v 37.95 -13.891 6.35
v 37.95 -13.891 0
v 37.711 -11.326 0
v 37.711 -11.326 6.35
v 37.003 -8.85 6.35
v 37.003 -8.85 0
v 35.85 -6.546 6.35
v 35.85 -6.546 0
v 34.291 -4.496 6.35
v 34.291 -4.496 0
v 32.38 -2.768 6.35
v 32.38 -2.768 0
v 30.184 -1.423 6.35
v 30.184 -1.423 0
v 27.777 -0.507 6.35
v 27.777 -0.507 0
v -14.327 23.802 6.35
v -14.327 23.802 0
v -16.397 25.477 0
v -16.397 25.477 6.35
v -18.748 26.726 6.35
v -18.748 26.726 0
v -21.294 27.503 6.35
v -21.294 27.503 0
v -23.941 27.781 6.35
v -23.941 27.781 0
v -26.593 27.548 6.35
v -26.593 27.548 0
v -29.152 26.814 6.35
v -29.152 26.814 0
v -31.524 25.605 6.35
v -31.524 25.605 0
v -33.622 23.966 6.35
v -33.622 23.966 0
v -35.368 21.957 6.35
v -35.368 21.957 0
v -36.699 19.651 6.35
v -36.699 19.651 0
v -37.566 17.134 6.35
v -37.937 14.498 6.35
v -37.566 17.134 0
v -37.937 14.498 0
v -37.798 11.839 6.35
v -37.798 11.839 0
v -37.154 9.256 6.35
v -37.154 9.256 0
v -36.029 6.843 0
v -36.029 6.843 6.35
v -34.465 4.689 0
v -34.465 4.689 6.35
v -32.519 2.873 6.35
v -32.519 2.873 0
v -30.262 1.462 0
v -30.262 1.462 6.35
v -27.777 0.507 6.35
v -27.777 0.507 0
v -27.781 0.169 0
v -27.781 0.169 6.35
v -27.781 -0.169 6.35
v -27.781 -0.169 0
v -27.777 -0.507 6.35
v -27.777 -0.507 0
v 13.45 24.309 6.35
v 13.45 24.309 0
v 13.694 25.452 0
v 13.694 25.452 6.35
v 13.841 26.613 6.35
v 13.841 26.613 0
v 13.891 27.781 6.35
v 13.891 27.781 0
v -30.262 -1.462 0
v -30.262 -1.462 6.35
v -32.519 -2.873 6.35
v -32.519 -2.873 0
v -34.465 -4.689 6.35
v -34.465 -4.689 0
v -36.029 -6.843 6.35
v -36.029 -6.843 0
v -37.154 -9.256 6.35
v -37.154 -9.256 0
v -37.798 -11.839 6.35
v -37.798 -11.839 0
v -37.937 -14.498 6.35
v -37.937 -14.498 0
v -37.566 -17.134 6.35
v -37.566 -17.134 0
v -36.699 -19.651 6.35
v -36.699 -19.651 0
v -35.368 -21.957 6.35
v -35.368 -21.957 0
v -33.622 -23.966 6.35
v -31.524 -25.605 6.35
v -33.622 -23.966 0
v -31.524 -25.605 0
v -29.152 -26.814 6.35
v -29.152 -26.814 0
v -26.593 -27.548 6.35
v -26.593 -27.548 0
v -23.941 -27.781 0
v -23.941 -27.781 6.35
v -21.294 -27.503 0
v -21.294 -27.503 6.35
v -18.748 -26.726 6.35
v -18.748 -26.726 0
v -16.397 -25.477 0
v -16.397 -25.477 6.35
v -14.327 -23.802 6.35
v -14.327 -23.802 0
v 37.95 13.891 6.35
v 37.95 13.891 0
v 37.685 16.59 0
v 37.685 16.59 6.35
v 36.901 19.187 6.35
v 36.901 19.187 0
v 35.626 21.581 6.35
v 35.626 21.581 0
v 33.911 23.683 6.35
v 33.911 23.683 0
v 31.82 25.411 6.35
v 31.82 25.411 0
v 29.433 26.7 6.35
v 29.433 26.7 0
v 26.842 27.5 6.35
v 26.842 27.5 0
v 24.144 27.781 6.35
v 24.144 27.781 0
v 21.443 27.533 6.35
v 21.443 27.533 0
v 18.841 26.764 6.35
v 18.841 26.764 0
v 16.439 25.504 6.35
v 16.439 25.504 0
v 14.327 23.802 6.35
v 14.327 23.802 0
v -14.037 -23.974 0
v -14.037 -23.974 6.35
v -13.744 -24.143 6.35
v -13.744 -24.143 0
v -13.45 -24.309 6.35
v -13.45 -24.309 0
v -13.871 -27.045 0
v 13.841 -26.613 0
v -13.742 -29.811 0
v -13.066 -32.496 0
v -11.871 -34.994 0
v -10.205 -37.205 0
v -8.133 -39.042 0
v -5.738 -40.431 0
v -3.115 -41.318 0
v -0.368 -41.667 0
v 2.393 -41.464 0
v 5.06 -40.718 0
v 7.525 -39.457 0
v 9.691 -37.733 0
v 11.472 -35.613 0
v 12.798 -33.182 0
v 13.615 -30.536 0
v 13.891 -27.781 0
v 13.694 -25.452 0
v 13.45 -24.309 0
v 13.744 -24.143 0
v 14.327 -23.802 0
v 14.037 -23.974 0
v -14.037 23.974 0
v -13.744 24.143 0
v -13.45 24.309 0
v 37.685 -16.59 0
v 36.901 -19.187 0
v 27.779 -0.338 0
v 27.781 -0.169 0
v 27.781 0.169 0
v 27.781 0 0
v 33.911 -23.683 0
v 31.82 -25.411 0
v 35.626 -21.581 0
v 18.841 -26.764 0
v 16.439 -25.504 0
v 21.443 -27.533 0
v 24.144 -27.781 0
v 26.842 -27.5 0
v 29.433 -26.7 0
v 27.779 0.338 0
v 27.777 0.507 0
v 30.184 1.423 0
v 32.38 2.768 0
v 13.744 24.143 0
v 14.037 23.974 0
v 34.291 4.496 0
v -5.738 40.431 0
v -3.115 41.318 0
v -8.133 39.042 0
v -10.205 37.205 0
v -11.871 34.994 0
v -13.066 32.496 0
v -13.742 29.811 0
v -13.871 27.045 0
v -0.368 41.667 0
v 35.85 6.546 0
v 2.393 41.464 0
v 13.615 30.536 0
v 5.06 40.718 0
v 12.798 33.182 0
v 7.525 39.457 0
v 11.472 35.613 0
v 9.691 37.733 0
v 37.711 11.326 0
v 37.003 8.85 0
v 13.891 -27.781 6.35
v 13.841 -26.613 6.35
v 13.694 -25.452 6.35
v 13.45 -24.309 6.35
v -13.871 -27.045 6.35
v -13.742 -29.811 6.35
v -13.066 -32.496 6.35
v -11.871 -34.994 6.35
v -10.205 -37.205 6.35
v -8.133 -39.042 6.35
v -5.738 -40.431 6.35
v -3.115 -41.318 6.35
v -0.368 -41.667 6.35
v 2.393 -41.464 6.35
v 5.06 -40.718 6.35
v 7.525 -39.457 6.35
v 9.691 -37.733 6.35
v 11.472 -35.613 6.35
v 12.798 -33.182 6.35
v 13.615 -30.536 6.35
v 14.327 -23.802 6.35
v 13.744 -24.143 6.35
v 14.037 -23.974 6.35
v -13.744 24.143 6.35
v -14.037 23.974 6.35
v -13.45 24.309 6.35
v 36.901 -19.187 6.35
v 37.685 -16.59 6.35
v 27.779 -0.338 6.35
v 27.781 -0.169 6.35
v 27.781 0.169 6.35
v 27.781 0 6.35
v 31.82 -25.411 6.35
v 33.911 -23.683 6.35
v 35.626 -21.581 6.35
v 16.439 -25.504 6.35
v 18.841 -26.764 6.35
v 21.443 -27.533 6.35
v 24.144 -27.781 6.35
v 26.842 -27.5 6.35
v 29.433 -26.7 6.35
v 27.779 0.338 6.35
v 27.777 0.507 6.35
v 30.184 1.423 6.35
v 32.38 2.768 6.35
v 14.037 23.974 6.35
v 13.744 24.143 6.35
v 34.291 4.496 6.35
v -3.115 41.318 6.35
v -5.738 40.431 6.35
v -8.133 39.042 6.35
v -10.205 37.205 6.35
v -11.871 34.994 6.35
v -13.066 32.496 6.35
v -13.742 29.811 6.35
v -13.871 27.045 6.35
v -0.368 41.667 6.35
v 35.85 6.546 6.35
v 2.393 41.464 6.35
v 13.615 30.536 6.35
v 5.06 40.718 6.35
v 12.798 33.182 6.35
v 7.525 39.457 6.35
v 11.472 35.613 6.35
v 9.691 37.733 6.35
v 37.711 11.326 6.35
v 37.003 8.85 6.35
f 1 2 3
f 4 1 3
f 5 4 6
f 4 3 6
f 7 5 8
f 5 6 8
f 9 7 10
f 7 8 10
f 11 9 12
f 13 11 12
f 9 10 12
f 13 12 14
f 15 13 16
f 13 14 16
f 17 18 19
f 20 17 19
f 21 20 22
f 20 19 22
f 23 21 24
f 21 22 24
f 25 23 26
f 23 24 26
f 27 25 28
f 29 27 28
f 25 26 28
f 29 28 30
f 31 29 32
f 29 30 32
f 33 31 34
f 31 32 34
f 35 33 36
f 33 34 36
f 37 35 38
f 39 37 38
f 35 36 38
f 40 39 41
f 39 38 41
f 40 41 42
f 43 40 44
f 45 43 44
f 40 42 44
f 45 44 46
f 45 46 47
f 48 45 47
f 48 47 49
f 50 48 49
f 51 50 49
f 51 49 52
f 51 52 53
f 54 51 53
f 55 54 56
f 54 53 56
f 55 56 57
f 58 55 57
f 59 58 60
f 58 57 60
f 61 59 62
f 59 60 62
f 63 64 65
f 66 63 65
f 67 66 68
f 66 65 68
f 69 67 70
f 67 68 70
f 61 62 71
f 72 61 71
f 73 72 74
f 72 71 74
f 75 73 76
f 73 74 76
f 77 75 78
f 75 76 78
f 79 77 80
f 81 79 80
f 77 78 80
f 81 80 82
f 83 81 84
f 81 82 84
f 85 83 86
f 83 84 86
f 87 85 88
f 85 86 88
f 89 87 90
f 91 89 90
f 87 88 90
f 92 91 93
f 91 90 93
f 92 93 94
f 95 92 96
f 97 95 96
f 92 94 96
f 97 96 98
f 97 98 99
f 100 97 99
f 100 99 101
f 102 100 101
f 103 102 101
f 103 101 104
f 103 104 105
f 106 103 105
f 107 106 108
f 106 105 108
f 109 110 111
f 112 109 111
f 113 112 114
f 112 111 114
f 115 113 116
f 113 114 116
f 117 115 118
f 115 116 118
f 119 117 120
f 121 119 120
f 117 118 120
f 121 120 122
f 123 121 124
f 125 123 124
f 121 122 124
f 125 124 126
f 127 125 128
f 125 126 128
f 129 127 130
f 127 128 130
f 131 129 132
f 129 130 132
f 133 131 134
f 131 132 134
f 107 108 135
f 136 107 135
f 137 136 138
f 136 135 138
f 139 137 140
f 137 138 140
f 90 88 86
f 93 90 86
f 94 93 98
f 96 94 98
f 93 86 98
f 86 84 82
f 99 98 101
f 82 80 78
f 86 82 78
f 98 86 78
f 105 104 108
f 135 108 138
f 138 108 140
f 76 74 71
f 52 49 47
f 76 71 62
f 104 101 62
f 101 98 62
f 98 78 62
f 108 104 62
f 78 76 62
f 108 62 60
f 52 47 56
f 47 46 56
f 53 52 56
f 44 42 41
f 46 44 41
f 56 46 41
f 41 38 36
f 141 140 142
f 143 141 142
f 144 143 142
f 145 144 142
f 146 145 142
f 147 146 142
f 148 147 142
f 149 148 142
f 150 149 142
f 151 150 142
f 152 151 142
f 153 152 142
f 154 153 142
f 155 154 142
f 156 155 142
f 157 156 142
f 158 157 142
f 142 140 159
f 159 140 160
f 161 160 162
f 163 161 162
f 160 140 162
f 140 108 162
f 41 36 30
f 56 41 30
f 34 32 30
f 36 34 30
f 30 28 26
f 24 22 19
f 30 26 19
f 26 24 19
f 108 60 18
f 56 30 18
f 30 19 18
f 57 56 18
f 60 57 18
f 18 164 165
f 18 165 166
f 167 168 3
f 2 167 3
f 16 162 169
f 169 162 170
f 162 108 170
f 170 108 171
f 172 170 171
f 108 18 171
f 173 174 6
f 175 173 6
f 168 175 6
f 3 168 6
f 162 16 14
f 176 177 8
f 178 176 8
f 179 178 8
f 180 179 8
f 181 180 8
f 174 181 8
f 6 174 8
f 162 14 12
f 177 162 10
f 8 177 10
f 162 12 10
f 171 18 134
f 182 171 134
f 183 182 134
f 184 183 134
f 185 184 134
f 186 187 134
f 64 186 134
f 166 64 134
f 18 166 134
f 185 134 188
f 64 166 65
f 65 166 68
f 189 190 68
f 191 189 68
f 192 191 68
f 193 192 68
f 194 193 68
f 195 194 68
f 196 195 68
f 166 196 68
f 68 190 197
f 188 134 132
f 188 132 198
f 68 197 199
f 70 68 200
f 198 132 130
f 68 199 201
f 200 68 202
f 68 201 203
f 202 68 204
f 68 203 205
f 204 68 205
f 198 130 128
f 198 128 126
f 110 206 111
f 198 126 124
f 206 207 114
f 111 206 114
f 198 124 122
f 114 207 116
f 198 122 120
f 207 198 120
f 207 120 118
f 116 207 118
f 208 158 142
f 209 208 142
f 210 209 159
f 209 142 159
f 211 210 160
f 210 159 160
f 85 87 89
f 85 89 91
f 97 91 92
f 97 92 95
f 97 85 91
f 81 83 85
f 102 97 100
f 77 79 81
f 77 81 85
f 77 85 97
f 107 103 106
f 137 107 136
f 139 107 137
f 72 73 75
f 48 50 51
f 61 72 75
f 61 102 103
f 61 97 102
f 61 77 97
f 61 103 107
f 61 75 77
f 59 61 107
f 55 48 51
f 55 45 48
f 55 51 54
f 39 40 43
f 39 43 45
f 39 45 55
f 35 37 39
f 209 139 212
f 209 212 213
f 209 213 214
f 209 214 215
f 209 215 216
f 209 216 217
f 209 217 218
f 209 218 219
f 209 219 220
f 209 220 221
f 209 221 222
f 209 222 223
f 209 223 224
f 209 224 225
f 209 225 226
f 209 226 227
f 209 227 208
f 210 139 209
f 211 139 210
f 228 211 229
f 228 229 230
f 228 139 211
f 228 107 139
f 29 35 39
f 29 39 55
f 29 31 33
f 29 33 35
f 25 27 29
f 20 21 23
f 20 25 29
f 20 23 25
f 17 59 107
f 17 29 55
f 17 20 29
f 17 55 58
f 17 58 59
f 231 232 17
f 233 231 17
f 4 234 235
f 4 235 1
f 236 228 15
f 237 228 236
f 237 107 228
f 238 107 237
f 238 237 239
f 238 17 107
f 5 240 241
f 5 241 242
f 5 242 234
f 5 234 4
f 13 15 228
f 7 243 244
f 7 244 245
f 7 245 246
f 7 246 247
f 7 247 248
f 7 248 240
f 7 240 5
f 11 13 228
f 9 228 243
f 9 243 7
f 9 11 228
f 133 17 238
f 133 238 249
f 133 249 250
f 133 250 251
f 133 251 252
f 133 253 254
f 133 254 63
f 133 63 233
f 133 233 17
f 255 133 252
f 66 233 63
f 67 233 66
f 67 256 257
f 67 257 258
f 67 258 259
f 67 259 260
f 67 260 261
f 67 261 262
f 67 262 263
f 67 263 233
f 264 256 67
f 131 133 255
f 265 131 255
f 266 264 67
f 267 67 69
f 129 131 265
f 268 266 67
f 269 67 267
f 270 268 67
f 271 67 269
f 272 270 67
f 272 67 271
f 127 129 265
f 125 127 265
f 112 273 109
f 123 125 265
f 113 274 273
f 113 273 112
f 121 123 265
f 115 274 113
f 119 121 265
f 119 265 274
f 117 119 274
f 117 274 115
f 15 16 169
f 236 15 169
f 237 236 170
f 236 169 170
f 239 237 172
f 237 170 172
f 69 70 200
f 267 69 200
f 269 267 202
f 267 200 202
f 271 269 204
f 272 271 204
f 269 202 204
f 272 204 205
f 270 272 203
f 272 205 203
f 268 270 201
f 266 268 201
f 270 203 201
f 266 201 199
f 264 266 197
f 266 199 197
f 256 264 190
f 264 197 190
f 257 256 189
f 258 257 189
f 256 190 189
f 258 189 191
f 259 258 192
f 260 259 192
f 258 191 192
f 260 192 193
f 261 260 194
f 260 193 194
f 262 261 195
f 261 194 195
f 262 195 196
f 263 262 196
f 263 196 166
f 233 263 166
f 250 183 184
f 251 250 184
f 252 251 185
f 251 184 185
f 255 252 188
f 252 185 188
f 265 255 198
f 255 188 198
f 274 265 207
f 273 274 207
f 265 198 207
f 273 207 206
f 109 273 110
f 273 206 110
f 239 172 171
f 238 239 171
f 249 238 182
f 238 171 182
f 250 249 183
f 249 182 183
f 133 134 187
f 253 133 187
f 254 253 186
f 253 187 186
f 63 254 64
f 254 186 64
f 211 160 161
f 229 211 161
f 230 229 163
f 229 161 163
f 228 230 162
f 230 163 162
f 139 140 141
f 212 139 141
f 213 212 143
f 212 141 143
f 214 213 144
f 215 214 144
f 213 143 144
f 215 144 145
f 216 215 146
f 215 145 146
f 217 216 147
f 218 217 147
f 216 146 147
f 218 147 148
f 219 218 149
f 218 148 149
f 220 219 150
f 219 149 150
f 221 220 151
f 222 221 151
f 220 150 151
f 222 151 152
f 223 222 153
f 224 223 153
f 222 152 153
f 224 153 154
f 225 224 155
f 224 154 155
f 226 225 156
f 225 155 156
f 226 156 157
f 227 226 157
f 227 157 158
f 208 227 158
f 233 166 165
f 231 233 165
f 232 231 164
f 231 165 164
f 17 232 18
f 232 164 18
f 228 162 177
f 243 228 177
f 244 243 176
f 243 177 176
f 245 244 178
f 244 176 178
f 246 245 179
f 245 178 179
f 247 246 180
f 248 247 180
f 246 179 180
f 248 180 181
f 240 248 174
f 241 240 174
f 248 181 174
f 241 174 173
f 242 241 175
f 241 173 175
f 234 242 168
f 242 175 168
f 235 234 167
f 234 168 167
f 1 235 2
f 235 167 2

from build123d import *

# Parameters (mm, degrees)
F1_DEPTH = 6.35


with BuildPart() as f1:
    # F0 (on Top) → F1 (new body)
    with BuildSketch(Plane.XY):
        with BuildLine():
            ThreePointArc((-24.0592682489, 0), (-14.2371131165, 4.0684698676), (-10.1686432489, 13.890625))
            ThreePointArc((-10.1686432489, 13.890625), (-10.6419546741, 17.4857827611), (-12.0296335682, 20.8359365366))
            ThreePointArc((-12.0296335682, 20.8359365366), (-13.0777646274, 22.3968604248), (-14.3270898061, 23.8019400312))
            ThreePointArc((-14.3270898061, 23.8019400312), (-24.0592682489, 13.890625), (-27.7766296295, 0.5066537188))
            ThreePointArc((-27.7766296295, 0.5066537188), (-25.9351329578, 0.1272462548), (-24.0592682489, 0))
        make_face()
        with BuildLine():
            ThreePointArc((-14.3270898061, 23.8019400312), (-13.0777646274, 22.3968604248), (-12.0296335682, 20.8359365366))
            ThreePointArc((-12.0296335682, 20.8359365366), (-12.8573677792, 22.5241066045), (-13.4495398234, 24.30859375))
            ThreePointArc((-13.4495398234, 24.30859375), (-13.890625, 24.0592682489), (-14.3270898061, 23.8019400312))
        make_face()
        with BuildLine():
            ThreePointArc((-13.4495398234, 24.30859375), (-12.8573677792, 22.5241066045), (-12.0296335682, 20.8359365366))
            ThreePointArc((-12.0296335682, 20.8359365366), (1.0177e-06, 13.890625), (12.0296345859, 20.8359382993))
            ThreePointArc((12.0296345859, 20.8359382993), (12.8573681644, 22.5241075465), (13.4495398234, 24.30859375))
            ThreePointArc((13.4495398234, 24.30859375), (0, 27.78125), (-13.4495398234, 24.30859375))
        make_face()
        with BuildLine():
            ThreePointArc((-27.7766296295, -0.5066537188), (-25.9351329578, -0.1272462548), (-24.0592682489, 0))
            ThreePointArc((-24.0592682489, 0), (-25.9351329578, 0.1272462548), (-27.7766296295, 0.5066537188))
            ThreePointArc((-27.7766296295, 0.5066537188), (-27.78125, 0), (-27.7766296295, -0.5066537188))
        make_face()
        with BuildLine():
            ThreePointArc((-10.1686432489, -13.890625), (-14.2371131165, -4.0684698676), (-24.0592682489, 0))
            ThreePointArc((-24.0592682489, 0), (-25.9351329578, -0.1272462548), (-27.7766296295, -0.5066537188))
            ThreePointArc((-27.7766296295, -0.5066537188), (-24.0592682489, -13.890625), (-14.3270898061, -23.8019400312))
            ThreePointArc((-14.3270898061, -23.8019400312), (-13.0777652945, -22.3968612859), (-12.0296346574, -20.8359384232))
            ThreePointArc((-12.0296346574, -20.8359384232), (-10.641954956, -17.4857838132), (-10.1686432489, -13.890625))
        make_face()
        with BuildLine():
            ThreePointArc((-27.7766296295, 0.5066537188), (-24.0592682489, 13.890625), (-14.3270898061, 23.8019400312))
            ThreePointArc((-14.3270898061, 23.8019400312), (-36.0889023733, 20.8359375), (-27.7766296295, 0.5066537188))
        make_face()
        with BuildLine():
            ThreePointArc((13.890625, 27.78125), (-1.7502783753, 41.5611624997), (-13.4495398234, 24.30859375))
            ThreePointArc((-13.4495398234, 24.30859375), (0, 27.78125), (13.4495398234, 24.30859375))
            ThreePointArc((13.4495398234, 24.30859375), (13.7799124997, 26.0309716247), (13.890625, 27.78125))
        make_face()
        with BuildLine():
            ThreePointArc((13.4495398234, 24.30859375), (12.8573681644, 22.5241075465), (12.0296345859, 20.8359382993))
            ThreePointArc((12.0296345859, 20.8359382993), (13.0777652506, 22.3968612294), (14.3270898061, 23.8019400312))
            ThreePointArc((14.3270898061, 23.8019400312), (13.890625, 24.0592682489), (13.4495398234, 24.30859375))
        make_face()
        with BuildLine():
            ThreePointArc((14.3270898061, 23.8019400312), (13.0777652506, 22.3968612294), (12.0296345859, 20.8359382993))
            ThreePointArc((12.0296345859, 20.8359382993), (12.0296338937, 6.9453128996), (24.0592682489, 0))
            ThreePointArc((24.0592682489, 0), (25.9351329578, 0.1272462548), (27.7766296295, 0.5066537188))
            ThreePointArc((27.7766296295, 0.5066537188), (24.0592682489, 13.890625), (14.3270898061, 23.8019400312))
        make_face()
        with BuildLine():
            ThreePointArc((-14.3270898061, -23.8019400312), (-24.0592682489, -13.890625), (-27.7766296295, -0.5066537188))
            ThreePointArc((-27.7766296295, -0.5066537188), (-36.0889023733, -20.8359375), (-14.3270898061, -23.8019400312))
        make_face()
        with BuildLine():
            ThreePointArc((37.9498932489, 13.890625), (29.4334389621, 26.6995184743), (14.3270898061, 23.8019400312))
            ThreePointArc((14.3270898061, 23.8019400312), (24.0592682489, 13.890625), (27.7766296295, 0.5066537188))
            ThreePointArc((27.7766296295, 0.5066537188), (35.1178833479, 5.4848832135), (37.9498932489, 13.890625))
        make_face()
        with BuildLine():
            ThreePointArc((27.7766296295, 0.5066537188), (25.9351329578, 0.1272462548), (24.0592682489, 0))
            ThreePointArc((24.0592682489, 0), (25.9351329578, -0.1272462548), (27.7766296295, -0.5066537188))
            ThreePointArc((27.7766296295, -0.5066537188), (27.7800948833, -0.2533373929), (27.78125, 0))
            ThreePointArc((27.78125, 0), (27.7800948833, 0.2533373929), (27.7766296295, 0.5066537188))
        make_face()
        with BuildLine():
            ThreePointArc((27.7766296295, -0.5066537188), (25.9351329578, -0.1272462548), (24.0592682489, 0))
            ThreePointArc((24.0592682489, 0), (12.0296338267, -6.9453130157), (12.0296347199, -20.8359385313))
            ThreePointArc((12.0296347199, -20.8359385313), (13.0777653327, -22.3968613353), (14.3270898061, -23.8019400312))
            ThreePointArc((14.3270898061, -23.8019400312), (24.0592682489, -13.890625), (27.7766296295, -0.5066537188))
        make_face()
        with BuildLine():
            ThreePointArc((12.0296347199, -20.8359385313), (6.25e-08, -13.890625), (-12.0296346574, -20.8359384232))
            ThreePointArc((-12.0296346574, -20.8359384232), (-12.8573681914, -22.5241076127), (-13.4495398234, -24.30859375))
            ThreePointArc((-13.4495398234, -24.30859375), (0, -27.78125), (13.4495398234, -24.30859375))
            ThreePointArc((13.4495398234, -24.30859375), (12.8573682151, -22.5241076705), (12.0296347199, -20.8359385313))
        make_face()
        with BuildLine():
            ThreePointArc((-13.4495398234, -24.30859375), (-12.8573681914, -22.5241076127), (-12.0296346574, -20.8359384232))
            ThreePointArc((-12.0296346574, -20.8359384232), (-13.0777652945, -22.3968612859), (-14.3270898061, -23.8019400312))
            ThreePointArc((-14.3270898061, -23.8019400312), (-13.890625, -24.0592682489), (-13.4495398234, -24.30859375))
        make_face()
        with BuildLine():
            ThreePointArc((37.9498932489, -13.890625), (35.1178833479, -5.4848832135), (27.7766296295, -0.5066537188))
            ThreePointArc((27.7766296295, -0.5066537188), (24.0592682489, -13.890625), (14.3270898061, -23.8019400312))
            ThreePointArc((14.3270898061, -23.8019400312), (29.4334389621, -26.6995184743), (37.9498932489, -13.890625))
        make_face()
        with BuildLine():
            ThreePointArc((14.3270898061, -23.8019400312), (13.0777653327, -22.3968613353), (12.0296347199, -20.8359385313))
            ThreePointArc((12.0296347199, -20.8359385313), (12.8573682151, -22.5241076705), (13.4495398234, -24.30859375))
            ThreePointArc((13.4495398234, -24.30859375), (13.890625, -24.0592682489), (14.3270898061, -23.8019400312))
        make_face()
        with BuildLine():
            ThreePointArc((13.4495398234, -24.30859375), (0, -27.78125), (-13.4495398234, -24.30859375))
            ThreePointArc((-13.4495398234, -24.30859375), (-1.7502783753, -41.5611624997), (13.890625, -27.78125))
            ThreePointArc((13.890625, -27.78125), (13.7799124997, -26.0309716247), (13.4495398234, -24.30859375))
        make_face()
        with BuildLine():
            ThreePointArc((-12.0296335682, 20.8359365366), (-10.6419546741, 17.4857827611), (-10.1686432489, 13.890625))
            ThreePointArc((-10.1686432489, 13.890625), (-14.2371131165, 4.0684698676), (-24.0592682489, 0))
            ThreePointArc((-24.0592682489, 0), (-14.2371131165, -4.0684698676), (-10.1686432489, -13.890625))
            ThreePointArc((-10.1686432489, -13.890625), (-10.641954956, -17.4857838132), (-12.0296346574, -20.8359384232))
            ThreePointArc((-12.0296346574, -20.8359384232), (6.25e-08, -13.890625), (12.0296347199, -20.8359385313))
            ThreePointArc((12.0296347199, -20.8359385313), (12.0296338267, -6.9453130157), (24.0592682489, 0))
            ThreePointArc((24.0592682489, 0), (12.0296338937, 6.9453128996), (12.0296345859, 20.8359382993))
            ThreePointArc((12.0296345859, 20.8359382993), (1.0177e-06, 13.890625), (-12.0296335682, 20.8359365366))
        make_face()
    extrude(amount=F1_DEPTH)


solid = f1.part
